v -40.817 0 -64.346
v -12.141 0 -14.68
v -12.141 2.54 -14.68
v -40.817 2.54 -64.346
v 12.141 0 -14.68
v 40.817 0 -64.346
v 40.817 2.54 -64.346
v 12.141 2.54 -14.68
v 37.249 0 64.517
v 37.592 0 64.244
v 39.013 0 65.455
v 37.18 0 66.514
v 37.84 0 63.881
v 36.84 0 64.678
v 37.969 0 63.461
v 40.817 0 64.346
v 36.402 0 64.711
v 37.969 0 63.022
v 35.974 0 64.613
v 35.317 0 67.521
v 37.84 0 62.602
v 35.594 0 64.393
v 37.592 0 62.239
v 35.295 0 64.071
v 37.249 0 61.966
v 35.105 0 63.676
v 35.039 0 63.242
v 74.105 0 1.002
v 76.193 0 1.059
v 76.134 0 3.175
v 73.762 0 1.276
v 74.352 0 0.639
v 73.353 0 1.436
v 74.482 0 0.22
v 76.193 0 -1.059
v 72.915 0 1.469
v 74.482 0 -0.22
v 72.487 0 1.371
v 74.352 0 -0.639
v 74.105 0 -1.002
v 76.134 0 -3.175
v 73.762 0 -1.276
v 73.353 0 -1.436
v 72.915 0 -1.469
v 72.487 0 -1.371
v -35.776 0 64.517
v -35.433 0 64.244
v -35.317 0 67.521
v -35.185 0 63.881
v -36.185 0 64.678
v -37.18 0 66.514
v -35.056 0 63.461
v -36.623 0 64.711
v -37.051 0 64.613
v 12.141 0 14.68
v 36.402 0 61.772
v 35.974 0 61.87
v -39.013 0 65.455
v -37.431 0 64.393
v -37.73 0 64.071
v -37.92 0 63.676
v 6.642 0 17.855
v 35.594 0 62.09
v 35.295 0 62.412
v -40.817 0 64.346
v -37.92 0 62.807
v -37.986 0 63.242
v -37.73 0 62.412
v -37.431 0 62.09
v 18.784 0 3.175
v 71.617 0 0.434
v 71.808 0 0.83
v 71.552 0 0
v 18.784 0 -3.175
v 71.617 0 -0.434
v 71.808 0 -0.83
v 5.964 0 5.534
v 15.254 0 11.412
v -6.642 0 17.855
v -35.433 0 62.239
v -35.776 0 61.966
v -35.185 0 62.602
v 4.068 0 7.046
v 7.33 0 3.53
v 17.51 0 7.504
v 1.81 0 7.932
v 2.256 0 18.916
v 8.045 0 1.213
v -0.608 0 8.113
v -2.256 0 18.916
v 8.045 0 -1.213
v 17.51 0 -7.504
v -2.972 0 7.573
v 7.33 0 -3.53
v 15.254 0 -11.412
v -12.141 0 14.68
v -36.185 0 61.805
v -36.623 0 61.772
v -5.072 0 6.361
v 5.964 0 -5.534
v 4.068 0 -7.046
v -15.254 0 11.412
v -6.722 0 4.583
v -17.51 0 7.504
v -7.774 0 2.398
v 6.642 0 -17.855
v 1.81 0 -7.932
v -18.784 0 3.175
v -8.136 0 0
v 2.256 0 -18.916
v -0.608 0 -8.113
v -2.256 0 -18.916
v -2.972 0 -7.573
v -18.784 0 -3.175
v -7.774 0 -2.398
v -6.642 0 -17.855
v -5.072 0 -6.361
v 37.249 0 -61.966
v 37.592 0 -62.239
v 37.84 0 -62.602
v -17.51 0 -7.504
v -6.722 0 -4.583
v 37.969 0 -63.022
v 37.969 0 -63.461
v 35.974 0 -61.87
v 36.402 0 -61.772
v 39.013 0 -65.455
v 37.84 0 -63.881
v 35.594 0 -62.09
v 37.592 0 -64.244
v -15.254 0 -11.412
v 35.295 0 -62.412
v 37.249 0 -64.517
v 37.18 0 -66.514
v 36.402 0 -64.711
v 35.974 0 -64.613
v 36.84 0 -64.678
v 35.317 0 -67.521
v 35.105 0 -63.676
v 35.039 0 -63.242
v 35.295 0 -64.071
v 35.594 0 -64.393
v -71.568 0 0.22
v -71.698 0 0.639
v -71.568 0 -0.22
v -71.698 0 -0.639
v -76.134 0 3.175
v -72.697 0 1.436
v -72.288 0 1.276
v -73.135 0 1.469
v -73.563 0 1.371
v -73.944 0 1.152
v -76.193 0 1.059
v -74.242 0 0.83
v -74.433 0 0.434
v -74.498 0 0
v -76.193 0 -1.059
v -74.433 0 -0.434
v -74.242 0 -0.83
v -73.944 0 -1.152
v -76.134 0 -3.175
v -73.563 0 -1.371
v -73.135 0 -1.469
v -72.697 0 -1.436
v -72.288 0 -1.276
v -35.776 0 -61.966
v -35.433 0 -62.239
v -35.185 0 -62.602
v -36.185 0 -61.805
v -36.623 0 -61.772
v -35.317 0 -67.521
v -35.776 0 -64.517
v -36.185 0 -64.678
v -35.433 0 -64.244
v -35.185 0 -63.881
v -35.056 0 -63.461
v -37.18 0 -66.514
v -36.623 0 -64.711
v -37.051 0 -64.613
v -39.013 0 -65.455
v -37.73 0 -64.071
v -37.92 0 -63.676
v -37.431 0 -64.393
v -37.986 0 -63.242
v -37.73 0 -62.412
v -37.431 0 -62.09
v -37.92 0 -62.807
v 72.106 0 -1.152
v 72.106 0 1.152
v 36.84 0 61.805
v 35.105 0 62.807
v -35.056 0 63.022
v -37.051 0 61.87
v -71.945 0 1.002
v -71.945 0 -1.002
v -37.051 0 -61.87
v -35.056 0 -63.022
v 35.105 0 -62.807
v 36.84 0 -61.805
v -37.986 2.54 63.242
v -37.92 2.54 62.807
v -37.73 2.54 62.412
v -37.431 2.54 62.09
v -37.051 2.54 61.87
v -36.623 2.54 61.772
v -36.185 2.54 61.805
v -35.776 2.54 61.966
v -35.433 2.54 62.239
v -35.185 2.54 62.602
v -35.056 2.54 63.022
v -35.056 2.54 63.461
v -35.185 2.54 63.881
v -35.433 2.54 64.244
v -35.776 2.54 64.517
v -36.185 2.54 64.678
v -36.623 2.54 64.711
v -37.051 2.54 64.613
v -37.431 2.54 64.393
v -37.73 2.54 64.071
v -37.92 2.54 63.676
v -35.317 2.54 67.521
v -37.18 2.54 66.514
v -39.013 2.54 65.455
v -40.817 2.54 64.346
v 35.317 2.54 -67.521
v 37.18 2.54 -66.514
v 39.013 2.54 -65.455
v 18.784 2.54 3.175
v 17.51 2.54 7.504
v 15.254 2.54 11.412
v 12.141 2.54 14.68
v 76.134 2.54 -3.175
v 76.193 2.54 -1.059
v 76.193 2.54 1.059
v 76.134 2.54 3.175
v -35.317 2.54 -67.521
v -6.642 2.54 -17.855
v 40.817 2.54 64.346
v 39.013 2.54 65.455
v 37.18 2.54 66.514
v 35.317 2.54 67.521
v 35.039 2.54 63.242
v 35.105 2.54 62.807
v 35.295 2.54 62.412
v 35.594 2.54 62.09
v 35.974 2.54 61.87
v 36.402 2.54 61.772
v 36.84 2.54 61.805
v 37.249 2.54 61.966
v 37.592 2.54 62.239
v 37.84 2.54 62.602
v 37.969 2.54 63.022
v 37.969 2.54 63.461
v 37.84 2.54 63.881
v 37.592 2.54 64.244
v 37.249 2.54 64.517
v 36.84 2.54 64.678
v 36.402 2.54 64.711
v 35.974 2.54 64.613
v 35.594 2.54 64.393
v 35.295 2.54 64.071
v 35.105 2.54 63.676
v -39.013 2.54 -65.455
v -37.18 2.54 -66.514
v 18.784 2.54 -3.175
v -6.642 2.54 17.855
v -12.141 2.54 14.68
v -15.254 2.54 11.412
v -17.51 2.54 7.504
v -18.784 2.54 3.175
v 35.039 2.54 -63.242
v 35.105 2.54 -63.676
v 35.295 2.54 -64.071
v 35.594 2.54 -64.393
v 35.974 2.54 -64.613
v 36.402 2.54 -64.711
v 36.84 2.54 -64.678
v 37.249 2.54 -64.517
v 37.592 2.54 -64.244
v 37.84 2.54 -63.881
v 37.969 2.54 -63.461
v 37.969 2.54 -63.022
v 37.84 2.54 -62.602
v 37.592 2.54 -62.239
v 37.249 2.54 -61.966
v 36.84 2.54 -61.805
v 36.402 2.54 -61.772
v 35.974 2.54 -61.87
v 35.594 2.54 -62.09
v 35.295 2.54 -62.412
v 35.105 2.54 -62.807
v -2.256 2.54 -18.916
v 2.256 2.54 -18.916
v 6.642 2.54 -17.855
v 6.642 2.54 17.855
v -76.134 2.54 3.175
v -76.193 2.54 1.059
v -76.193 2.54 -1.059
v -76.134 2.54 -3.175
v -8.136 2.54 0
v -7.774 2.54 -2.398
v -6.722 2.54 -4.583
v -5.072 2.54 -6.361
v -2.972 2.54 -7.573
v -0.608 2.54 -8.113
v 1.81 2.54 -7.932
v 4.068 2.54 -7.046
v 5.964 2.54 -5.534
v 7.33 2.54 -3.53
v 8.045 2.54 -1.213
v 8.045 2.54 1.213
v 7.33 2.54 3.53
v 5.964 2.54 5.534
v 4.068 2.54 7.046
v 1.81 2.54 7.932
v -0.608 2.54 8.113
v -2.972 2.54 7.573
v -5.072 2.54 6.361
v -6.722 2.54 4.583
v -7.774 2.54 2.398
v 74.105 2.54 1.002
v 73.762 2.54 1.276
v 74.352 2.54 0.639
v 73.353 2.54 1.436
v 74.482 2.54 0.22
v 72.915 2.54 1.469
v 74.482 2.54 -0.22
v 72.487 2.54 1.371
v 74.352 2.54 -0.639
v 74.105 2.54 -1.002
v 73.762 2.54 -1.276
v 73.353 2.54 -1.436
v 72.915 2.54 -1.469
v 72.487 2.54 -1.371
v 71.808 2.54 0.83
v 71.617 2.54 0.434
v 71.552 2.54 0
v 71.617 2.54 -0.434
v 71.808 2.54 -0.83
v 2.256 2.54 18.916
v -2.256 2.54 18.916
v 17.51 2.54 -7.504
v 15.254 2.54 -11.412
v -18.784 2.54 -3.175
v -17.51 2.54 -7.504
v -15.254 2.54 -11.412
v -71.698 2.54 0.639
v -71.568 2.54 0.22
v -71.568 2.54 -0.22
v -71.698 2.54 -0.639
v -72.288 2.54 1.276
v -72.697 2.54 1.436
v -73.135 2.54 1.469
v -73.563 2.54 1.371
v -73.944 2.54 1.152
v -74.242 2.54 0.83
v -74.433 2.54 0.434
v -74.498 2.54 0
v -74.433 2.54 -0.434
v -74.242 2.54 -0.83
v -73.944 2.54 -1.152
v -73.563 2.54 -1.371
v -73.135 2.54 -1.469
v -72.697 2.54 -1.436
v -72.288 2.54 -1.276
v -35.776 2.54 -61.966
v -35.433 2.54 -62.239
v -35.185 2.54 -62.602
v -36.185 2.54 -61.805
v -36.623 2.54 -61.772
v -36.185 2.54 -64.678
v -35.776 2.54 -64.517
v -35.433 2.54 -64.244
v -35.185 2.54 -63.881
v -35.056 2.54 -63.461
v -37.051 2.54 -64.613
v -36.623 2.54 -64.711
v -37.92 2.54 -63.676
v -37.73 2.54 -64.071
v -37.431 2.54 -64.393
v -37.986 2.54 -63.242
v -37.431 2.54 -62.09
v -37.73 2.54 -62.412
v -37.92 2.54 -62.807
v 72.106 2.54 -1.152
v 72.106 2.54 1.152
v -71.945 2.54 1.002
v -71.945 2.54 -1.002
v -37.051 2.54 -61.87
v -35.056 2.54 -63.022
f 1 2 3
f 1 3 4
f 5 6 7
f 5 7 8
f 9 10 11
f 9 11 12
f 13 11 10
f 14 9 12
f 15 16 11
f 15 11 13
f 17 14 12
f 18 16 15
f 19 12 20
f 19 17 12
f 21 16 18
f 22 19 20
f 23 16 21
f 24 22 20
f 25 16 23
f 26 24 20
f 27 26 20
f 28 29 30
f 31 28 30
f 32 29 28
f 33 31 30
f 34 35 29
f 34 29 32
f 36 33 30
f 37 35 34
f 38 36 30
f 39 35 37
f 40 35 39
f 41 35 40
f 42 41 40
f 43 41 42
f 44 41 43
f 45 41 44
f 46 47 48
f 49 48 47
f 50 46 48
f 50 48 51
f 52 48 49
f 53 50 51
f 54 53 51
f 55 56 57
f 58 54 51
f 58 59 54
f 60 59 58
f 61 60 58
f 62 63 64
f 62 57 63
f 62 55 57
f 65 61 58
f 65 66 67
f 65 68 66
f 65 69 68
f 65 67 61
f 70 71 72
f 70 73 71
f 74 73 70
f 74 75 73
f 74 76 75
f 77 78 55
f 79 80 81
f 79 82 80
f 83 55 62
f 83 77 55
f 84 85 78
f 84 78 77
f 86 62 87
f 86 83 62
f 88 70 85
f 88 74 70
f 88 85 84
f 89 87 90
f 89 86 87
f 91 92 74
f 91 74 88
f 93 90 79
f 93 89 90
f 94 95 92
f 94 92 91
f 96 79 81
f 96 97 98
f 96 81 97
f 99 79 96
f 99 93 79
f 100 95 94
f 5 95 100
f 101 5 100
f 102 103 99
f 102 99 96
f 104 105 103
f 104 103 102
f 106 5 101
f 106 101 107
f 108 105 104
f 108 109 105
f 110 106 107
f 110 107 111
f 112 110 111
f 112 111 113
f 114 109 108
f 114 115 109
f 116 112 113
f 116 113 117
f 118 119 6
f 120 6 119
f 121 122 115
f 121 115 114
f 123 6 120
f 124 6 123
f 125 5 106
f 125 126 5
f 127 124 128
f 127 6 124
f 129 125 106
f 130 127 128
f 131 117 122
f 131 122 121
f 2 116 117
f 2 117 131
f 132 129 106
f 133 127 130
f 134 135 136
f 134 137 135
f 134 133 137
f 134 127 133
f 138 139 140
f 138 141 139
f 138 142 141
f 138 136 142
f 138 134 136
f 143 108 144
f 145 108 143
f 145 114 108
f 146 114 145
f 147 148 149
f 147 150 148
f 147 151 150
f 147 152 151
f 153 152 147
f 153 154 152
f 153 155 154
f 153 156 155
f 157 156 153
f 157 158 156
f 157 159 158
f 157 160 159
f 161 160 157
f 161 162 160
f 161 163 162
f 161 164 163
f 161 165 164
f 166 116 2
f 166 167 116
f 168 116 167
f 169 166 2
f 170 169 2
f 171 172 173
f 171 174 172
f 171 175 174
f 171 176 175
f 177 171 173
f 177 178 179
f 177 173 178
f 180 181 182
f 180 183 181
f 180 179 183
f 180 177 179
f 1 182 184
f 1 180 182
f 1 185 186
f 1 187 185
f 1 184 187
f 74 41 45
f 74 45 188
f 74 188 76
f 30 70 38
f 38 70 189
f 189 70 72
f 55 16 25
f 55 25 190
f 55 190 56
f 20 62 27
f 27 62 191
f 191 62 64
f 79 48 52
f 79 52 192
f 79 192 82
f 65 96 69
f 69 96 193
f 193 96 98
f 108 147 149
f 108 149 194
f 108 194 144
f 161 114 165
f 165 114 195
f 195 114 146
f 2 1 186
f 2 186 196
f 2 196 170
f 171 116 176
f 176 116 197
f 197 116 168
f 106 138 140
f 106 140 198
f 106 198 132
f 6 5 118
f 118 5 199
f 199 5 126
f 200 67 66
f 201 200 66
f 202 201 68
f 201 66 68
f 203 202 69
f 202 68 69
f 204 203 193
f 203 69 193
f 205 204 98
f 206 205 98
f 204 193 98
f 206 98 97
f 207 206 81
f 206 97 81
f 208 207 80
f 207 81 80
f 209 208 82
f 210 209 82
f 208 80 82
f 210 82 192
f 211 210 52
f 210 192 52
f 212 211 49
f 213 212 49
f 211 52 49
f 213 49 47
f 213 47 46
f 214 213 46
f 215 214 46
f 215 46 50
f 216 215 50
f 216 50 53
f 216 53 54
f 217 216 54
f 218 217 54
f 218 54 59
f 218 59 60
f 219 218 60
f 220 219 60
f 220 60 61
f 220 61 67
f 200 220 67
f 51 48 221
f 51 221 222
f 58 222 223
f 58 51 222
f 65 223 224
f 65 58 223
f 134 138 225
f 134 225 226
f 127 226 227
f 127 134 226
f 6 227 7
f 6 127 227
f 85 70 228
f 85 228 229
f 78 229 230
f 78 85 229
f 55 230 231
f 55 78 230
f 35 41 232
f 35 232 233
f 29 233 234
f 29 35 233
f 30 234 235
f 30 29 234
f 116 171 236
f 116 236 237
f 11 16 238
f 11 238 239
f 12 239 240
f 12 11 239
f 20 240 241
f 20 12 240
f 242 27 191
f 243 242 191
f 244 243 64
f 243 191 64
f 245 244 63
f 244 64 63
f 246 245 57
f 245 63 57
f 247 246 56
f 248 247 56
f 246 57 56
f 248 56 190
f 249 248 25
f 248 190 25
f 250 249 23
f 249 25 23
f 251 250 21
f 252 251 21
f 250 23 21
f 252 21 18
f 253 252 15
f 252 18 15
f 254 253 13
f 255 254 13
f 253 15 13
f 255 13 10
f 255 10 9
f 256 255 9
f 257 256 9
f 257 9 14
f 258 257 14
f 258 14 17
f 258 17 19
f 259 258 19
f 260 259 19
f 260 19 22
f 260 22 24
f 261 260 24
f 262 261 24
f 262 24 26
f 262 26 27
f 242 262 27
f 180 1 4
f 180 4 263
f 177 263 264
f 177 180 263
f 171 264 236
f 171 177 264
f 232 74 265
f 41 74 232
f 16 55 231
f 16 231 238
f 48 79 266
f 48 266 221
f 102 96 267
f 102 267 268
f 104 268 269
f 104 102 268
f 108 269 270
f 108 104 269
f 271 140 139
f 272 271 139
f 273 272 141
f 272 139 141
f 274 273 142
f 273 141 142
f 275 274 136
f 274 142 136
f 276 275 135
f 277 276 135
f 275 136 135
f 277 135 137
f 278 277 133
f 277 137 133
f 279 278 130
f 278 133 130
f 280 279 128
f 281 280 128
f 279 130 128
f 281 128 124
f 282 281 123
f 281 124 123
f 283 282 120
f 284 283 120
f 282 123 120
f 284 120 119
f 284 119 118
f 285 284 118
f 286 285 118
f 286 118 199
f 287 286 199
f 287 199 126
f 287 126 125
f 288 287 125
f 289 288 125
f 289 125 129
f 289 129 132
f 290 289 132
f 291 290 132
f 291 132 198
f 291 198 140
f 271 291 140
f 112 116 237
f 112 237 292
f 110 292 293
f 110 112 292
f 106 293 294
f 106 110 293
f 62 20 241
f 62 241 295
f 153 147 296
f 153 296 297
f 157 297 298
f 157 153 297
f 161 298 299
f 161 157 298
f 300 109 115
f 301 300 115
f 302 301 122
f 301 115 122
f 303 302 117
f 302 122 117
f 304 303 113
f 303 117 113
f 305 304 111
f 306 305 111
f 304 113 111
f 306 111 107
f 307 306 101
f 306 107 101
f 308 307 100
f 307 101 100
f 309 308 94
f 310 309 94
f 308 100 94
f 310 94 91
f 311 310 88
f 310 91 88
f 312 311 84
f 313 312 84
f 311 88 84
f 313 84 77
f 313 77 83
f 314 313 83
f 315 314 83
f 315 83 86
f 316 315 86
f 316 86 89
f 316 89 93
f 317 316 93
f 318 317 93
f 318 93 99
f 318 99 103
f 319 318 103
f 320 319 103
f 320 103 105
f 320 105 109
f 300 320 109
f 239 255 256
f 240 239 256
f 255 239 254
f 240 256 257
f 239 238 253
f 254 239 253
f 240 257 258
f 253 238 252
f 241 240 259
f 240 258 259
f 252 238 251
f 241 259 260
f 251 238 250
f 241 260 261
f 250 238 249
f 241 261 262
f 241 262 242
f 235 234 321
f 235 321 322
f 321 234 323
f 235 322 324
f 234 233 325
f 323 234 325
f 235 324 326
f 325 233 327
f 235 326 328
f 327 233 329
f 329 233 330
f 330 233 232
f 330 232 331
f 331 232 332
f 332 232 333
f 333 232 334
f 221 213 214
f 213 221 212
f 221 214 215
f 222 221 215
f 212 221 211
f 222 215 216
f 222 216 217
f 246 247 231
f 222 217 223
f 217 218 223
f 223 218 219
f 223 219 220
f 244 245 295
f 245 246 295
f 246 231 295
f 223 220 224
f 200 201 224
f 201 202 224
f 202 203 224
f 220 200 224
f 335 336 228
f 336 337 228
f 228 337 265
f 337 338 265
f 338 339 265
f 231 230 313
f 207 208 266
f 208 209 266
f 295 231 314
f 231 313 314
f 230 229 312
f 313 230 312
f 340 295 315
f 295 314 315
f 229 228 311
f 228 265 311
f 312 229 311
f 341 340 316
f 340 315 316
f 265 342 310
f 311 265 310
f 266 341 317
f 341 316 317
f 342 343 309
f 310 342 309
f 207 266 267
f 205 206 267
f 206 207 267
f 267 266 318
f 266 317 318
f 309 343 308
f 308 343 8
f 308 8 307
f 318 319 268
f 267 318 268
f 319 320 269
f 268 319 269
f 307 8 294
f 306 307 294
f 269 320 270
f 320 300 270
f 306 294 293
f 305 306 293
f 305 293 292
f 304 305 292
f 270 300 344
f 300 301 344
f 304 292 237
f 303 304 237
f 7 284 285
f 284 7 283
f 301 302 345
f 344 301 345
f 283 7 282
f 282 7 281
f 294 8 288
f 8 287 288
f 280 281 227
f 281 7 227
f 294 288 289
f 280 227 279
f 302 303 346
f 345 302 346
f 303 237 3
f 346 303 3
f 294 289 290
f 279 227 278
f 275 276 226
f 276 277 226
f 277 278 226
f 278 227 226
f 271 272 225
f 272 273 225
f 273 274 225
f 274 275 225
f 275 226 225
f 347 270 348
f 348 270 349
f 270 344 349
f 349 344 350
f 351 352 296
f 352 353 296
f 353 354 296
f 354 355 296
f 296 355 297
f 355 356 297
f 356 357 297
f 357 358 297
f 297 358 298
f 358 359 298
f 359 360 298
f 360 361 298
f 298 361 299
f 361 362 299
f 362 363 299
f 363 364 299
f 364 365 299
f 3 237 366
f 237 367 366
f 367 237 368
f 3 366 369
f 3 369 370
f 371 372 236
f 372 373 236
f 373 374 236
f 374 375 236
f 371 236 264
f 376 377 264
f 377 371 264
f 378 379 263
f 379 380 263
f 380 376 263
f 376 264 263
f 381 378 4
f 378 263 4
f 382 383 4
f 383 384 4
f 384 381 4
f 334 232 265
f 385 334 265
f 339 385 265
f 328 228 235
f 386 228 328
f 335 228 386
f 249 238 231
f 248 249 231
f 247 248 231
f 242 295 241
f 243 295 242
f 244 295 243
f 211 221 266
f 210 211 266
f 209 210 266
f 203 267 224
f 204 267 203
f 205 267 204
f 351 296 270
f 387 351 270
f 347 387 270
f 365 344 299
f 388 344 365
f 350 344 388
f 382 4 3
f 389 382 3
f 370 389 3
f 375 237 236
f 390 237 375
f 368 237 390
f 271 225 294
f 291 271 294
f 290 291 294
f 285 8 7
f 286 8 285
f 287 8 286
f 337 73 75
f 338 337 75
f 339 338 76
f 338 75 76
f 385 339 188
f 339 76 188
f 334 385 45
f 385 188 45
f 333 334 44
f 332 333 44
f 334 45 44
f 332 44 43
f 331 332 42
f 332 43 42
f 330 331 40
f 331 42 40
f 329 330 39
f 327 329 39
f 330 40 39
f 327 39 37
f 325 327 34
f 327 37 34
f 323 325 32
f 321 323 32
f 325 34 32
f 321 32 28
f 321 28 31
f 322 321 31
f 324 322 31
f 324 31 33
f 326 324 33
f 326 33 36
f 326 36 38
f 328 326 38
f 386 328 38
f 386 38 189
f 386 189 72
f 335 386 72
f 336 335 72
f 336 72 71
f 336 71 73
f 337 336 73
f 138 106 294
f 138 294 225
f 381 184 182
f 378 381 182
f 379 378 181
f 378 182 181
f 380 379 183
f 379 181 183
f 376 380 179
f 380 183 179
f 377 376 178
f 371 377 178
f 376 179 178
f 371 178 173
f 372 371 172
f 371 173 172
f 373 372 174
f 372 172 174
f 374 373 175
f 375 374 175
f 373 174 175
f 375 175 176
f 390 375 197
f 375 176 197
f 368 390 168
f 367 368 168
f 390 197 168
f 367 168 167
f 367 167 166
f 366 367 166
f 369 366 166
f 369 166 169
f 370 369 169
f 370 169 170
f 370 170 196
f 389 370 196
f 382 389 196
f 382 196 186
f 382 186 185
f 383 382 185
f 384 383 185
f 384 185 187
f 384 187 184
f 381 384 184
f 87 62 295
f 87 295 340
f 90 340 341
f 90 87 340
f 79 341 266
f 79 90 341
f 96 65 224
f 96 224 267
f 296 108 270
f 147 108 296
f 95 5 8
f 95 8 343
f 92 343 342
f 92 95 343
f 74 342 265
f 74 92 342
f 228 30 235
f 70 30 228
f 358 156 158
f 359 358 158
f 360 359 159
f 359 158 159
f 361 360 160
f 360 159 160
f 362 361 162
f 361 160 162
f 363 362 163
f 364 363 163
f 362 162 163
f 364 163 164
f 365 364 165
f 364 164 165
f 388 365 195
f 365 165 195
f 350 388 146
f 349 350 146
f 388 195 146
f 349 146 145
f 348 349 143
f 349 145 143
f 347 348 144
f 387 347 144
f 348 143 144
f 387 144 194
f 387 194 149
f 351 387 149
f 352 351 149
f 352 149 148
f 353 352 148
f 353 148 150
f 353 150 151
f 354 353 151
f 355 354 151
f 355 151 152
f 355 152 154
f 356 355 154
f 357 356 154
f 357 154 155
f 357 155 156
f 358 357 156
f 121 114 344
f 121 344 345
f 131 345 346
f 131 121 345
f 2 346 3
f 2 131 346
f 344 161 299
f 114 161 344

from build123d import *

# Parameters (mm, degrees)
BOSS_EXTRUDE1_DEPTH         = 2.54
F_5_8_CLEARANCE_HOLE1_D     = 16.27124
F_5_8_CLEARANCE_HOLE1_DEPTH = 38.354
F_5_8_CLEARANCE_HOLE1_TIP   = 4.888373669
F_4_CLEARANCE_HOLE1_D       = 2.9464
F_4_CLEARANCE_HOLE1_DEPTH   = 38.354
F_4_CLEARANCE_HOLE1_TIP     = 0.885187864


with BuildPart() as part:
    # Sketch1 → Boss-Extrude1 (new body)
    with BuildSketch(Plane(origin=(0, 0, 0), x_dir=(1, 0, 0), z_dir=(0, 1, 0))):
        with BuildLine():
            Line((18.783553311, 3.175), (76.133825433, 3.175))
            ThreePointArc((76.133825433, 3.175), (76.2, 0), (76.133825433, -3.175))
            Line((76.133825433, -3.175), (18.783553311, -3.175))
            ThreePointArc((18.783553311, -3.175), (16.497783942, -9.525), (12.141407313, -14.679534341))
            Line((12.141407313, -14.679534341), (40.816543373, -64.346326912))
            ThreePointArc((40.816543373, -64.346326912), (38.1, -65.991135768), (35.317282059, -67.521326912))
            Line((35.317282059, -67.521326912), (6.642145999, -17.854534341))
            ThreePointArc((6.642145999, -17.854534341), (0, -19.05), (-6.642145999, -17.854534341))
            Line((-6.642145999, -17.854534341), (-35.317282059, -67.521326912))
            ThreePointArc((-35.317282059, -67.521326912), (-38.1, -65.991135768), (-40.816543373, -64.346326912))
            Line((-40.816543373, -64.346326912), (-12.141407313, -14.679534341))
            ThreePointArc((-12.141407313, -14.679534341), (-16.497783942, -9.525), (-18.783553311, -3.175))
            Line((-18.783553311, -3.175), (-76.133825433, -3.175))
            ThreePointArc((-76.133825433, -3.175), (-76.2, 0), (-76.133825433, 3.175))
            Line((-76.133825433, 3.175), (-18.783553311, 3.175))
            ThreePointArc((-18.783553311, 3.175), (-16.497783942, 9.525), (-12.141407313, 14.679534341))
            Line((-12.141407313, 14.679534341), (-40.816543373, 64.346326912))
            ThreePointArc((-40.816543373, 64.346326912), (-38.1, 65.991135768), (-35.317282059, 67.521326912))
            Line((-35.317282059, 67.521326912), (-6.642145999, 17.854534341))
            ThreePointArc((-6.642145999, 17.854534341), (0, 19.05), (6.642145999, 17.854534341))
            Line((6.642145999, 17.854534341), (35.317282059, 67.521326912))
            ThreePointArc((35.317282059, 67.521326912), (38.1, 65.991135768), (40.816543373, 64.346326912))
            Line((40.816543373, 64.346326912), (12.141407313, 14.679534341))
            ThreePointArc((12.141407313, 14.679534341), (16.497783942, 9.525), (18.783553311, 3.175))
        make_face()
    extrude(amount=BOSS_EXTRUDE1_DEPTH)

    # 5/8 Clearance Hole1
    with Locations(Plane(origin=(0, 2.54, 0), x_dir=(1, 0, 0), z_dir=(0, 1, 0))):
        with Locations((0, 0)):
            Hole(F_5_8_CLEARANCE_HOLE1_D / 2, depth=F_5_8_CLEARANCE_HOLE1_DEPTH)
            with Locations((0, 0, -(F_5_8_CLEARANCE_HOLE1_DEPTH + F_5_8_CLEARANCE_HOLE1_TIP / 2))):  # 118° drill point
                Cone(0, F_5_8_CLEARANCE_HOLE1_D / 2, F_5_8_CLEARANCE_HOLE1_TIP, mode=Mode.SUBTRACT)

    # #4 Clearance Hole1
    with Locations(Plane(origin=(0, 2.54, 0), x_dir=(1, 0, 0), z_dir=(0, 1, 0))):
        with Locations((-73.025, 0), (-36.5125, 63.241505111), (36.5125, 63.241505111), (73.025, 0), (36.5125, -63.241505111), (-36.5125, -63.241505111)):
            Hole(F_4_CLEARANCE_HOLE1_D / 2, depth=F_4_CLEARANCE_HOLE1_DEPTH)
            with Locations((0, 0, -(F_4_CLEARANCE_HOLE1_DEPTH + F_4_CLEARANCE_HOLE1_TIP / 2))):  # 118° drill point
                Cone(0, F_4_CLEARANCE_HOLE1_D / 2, F_4_CLEARANCE_HOLE1_TIP, mode=Mode.SUBTRACT)


solid = part.part
